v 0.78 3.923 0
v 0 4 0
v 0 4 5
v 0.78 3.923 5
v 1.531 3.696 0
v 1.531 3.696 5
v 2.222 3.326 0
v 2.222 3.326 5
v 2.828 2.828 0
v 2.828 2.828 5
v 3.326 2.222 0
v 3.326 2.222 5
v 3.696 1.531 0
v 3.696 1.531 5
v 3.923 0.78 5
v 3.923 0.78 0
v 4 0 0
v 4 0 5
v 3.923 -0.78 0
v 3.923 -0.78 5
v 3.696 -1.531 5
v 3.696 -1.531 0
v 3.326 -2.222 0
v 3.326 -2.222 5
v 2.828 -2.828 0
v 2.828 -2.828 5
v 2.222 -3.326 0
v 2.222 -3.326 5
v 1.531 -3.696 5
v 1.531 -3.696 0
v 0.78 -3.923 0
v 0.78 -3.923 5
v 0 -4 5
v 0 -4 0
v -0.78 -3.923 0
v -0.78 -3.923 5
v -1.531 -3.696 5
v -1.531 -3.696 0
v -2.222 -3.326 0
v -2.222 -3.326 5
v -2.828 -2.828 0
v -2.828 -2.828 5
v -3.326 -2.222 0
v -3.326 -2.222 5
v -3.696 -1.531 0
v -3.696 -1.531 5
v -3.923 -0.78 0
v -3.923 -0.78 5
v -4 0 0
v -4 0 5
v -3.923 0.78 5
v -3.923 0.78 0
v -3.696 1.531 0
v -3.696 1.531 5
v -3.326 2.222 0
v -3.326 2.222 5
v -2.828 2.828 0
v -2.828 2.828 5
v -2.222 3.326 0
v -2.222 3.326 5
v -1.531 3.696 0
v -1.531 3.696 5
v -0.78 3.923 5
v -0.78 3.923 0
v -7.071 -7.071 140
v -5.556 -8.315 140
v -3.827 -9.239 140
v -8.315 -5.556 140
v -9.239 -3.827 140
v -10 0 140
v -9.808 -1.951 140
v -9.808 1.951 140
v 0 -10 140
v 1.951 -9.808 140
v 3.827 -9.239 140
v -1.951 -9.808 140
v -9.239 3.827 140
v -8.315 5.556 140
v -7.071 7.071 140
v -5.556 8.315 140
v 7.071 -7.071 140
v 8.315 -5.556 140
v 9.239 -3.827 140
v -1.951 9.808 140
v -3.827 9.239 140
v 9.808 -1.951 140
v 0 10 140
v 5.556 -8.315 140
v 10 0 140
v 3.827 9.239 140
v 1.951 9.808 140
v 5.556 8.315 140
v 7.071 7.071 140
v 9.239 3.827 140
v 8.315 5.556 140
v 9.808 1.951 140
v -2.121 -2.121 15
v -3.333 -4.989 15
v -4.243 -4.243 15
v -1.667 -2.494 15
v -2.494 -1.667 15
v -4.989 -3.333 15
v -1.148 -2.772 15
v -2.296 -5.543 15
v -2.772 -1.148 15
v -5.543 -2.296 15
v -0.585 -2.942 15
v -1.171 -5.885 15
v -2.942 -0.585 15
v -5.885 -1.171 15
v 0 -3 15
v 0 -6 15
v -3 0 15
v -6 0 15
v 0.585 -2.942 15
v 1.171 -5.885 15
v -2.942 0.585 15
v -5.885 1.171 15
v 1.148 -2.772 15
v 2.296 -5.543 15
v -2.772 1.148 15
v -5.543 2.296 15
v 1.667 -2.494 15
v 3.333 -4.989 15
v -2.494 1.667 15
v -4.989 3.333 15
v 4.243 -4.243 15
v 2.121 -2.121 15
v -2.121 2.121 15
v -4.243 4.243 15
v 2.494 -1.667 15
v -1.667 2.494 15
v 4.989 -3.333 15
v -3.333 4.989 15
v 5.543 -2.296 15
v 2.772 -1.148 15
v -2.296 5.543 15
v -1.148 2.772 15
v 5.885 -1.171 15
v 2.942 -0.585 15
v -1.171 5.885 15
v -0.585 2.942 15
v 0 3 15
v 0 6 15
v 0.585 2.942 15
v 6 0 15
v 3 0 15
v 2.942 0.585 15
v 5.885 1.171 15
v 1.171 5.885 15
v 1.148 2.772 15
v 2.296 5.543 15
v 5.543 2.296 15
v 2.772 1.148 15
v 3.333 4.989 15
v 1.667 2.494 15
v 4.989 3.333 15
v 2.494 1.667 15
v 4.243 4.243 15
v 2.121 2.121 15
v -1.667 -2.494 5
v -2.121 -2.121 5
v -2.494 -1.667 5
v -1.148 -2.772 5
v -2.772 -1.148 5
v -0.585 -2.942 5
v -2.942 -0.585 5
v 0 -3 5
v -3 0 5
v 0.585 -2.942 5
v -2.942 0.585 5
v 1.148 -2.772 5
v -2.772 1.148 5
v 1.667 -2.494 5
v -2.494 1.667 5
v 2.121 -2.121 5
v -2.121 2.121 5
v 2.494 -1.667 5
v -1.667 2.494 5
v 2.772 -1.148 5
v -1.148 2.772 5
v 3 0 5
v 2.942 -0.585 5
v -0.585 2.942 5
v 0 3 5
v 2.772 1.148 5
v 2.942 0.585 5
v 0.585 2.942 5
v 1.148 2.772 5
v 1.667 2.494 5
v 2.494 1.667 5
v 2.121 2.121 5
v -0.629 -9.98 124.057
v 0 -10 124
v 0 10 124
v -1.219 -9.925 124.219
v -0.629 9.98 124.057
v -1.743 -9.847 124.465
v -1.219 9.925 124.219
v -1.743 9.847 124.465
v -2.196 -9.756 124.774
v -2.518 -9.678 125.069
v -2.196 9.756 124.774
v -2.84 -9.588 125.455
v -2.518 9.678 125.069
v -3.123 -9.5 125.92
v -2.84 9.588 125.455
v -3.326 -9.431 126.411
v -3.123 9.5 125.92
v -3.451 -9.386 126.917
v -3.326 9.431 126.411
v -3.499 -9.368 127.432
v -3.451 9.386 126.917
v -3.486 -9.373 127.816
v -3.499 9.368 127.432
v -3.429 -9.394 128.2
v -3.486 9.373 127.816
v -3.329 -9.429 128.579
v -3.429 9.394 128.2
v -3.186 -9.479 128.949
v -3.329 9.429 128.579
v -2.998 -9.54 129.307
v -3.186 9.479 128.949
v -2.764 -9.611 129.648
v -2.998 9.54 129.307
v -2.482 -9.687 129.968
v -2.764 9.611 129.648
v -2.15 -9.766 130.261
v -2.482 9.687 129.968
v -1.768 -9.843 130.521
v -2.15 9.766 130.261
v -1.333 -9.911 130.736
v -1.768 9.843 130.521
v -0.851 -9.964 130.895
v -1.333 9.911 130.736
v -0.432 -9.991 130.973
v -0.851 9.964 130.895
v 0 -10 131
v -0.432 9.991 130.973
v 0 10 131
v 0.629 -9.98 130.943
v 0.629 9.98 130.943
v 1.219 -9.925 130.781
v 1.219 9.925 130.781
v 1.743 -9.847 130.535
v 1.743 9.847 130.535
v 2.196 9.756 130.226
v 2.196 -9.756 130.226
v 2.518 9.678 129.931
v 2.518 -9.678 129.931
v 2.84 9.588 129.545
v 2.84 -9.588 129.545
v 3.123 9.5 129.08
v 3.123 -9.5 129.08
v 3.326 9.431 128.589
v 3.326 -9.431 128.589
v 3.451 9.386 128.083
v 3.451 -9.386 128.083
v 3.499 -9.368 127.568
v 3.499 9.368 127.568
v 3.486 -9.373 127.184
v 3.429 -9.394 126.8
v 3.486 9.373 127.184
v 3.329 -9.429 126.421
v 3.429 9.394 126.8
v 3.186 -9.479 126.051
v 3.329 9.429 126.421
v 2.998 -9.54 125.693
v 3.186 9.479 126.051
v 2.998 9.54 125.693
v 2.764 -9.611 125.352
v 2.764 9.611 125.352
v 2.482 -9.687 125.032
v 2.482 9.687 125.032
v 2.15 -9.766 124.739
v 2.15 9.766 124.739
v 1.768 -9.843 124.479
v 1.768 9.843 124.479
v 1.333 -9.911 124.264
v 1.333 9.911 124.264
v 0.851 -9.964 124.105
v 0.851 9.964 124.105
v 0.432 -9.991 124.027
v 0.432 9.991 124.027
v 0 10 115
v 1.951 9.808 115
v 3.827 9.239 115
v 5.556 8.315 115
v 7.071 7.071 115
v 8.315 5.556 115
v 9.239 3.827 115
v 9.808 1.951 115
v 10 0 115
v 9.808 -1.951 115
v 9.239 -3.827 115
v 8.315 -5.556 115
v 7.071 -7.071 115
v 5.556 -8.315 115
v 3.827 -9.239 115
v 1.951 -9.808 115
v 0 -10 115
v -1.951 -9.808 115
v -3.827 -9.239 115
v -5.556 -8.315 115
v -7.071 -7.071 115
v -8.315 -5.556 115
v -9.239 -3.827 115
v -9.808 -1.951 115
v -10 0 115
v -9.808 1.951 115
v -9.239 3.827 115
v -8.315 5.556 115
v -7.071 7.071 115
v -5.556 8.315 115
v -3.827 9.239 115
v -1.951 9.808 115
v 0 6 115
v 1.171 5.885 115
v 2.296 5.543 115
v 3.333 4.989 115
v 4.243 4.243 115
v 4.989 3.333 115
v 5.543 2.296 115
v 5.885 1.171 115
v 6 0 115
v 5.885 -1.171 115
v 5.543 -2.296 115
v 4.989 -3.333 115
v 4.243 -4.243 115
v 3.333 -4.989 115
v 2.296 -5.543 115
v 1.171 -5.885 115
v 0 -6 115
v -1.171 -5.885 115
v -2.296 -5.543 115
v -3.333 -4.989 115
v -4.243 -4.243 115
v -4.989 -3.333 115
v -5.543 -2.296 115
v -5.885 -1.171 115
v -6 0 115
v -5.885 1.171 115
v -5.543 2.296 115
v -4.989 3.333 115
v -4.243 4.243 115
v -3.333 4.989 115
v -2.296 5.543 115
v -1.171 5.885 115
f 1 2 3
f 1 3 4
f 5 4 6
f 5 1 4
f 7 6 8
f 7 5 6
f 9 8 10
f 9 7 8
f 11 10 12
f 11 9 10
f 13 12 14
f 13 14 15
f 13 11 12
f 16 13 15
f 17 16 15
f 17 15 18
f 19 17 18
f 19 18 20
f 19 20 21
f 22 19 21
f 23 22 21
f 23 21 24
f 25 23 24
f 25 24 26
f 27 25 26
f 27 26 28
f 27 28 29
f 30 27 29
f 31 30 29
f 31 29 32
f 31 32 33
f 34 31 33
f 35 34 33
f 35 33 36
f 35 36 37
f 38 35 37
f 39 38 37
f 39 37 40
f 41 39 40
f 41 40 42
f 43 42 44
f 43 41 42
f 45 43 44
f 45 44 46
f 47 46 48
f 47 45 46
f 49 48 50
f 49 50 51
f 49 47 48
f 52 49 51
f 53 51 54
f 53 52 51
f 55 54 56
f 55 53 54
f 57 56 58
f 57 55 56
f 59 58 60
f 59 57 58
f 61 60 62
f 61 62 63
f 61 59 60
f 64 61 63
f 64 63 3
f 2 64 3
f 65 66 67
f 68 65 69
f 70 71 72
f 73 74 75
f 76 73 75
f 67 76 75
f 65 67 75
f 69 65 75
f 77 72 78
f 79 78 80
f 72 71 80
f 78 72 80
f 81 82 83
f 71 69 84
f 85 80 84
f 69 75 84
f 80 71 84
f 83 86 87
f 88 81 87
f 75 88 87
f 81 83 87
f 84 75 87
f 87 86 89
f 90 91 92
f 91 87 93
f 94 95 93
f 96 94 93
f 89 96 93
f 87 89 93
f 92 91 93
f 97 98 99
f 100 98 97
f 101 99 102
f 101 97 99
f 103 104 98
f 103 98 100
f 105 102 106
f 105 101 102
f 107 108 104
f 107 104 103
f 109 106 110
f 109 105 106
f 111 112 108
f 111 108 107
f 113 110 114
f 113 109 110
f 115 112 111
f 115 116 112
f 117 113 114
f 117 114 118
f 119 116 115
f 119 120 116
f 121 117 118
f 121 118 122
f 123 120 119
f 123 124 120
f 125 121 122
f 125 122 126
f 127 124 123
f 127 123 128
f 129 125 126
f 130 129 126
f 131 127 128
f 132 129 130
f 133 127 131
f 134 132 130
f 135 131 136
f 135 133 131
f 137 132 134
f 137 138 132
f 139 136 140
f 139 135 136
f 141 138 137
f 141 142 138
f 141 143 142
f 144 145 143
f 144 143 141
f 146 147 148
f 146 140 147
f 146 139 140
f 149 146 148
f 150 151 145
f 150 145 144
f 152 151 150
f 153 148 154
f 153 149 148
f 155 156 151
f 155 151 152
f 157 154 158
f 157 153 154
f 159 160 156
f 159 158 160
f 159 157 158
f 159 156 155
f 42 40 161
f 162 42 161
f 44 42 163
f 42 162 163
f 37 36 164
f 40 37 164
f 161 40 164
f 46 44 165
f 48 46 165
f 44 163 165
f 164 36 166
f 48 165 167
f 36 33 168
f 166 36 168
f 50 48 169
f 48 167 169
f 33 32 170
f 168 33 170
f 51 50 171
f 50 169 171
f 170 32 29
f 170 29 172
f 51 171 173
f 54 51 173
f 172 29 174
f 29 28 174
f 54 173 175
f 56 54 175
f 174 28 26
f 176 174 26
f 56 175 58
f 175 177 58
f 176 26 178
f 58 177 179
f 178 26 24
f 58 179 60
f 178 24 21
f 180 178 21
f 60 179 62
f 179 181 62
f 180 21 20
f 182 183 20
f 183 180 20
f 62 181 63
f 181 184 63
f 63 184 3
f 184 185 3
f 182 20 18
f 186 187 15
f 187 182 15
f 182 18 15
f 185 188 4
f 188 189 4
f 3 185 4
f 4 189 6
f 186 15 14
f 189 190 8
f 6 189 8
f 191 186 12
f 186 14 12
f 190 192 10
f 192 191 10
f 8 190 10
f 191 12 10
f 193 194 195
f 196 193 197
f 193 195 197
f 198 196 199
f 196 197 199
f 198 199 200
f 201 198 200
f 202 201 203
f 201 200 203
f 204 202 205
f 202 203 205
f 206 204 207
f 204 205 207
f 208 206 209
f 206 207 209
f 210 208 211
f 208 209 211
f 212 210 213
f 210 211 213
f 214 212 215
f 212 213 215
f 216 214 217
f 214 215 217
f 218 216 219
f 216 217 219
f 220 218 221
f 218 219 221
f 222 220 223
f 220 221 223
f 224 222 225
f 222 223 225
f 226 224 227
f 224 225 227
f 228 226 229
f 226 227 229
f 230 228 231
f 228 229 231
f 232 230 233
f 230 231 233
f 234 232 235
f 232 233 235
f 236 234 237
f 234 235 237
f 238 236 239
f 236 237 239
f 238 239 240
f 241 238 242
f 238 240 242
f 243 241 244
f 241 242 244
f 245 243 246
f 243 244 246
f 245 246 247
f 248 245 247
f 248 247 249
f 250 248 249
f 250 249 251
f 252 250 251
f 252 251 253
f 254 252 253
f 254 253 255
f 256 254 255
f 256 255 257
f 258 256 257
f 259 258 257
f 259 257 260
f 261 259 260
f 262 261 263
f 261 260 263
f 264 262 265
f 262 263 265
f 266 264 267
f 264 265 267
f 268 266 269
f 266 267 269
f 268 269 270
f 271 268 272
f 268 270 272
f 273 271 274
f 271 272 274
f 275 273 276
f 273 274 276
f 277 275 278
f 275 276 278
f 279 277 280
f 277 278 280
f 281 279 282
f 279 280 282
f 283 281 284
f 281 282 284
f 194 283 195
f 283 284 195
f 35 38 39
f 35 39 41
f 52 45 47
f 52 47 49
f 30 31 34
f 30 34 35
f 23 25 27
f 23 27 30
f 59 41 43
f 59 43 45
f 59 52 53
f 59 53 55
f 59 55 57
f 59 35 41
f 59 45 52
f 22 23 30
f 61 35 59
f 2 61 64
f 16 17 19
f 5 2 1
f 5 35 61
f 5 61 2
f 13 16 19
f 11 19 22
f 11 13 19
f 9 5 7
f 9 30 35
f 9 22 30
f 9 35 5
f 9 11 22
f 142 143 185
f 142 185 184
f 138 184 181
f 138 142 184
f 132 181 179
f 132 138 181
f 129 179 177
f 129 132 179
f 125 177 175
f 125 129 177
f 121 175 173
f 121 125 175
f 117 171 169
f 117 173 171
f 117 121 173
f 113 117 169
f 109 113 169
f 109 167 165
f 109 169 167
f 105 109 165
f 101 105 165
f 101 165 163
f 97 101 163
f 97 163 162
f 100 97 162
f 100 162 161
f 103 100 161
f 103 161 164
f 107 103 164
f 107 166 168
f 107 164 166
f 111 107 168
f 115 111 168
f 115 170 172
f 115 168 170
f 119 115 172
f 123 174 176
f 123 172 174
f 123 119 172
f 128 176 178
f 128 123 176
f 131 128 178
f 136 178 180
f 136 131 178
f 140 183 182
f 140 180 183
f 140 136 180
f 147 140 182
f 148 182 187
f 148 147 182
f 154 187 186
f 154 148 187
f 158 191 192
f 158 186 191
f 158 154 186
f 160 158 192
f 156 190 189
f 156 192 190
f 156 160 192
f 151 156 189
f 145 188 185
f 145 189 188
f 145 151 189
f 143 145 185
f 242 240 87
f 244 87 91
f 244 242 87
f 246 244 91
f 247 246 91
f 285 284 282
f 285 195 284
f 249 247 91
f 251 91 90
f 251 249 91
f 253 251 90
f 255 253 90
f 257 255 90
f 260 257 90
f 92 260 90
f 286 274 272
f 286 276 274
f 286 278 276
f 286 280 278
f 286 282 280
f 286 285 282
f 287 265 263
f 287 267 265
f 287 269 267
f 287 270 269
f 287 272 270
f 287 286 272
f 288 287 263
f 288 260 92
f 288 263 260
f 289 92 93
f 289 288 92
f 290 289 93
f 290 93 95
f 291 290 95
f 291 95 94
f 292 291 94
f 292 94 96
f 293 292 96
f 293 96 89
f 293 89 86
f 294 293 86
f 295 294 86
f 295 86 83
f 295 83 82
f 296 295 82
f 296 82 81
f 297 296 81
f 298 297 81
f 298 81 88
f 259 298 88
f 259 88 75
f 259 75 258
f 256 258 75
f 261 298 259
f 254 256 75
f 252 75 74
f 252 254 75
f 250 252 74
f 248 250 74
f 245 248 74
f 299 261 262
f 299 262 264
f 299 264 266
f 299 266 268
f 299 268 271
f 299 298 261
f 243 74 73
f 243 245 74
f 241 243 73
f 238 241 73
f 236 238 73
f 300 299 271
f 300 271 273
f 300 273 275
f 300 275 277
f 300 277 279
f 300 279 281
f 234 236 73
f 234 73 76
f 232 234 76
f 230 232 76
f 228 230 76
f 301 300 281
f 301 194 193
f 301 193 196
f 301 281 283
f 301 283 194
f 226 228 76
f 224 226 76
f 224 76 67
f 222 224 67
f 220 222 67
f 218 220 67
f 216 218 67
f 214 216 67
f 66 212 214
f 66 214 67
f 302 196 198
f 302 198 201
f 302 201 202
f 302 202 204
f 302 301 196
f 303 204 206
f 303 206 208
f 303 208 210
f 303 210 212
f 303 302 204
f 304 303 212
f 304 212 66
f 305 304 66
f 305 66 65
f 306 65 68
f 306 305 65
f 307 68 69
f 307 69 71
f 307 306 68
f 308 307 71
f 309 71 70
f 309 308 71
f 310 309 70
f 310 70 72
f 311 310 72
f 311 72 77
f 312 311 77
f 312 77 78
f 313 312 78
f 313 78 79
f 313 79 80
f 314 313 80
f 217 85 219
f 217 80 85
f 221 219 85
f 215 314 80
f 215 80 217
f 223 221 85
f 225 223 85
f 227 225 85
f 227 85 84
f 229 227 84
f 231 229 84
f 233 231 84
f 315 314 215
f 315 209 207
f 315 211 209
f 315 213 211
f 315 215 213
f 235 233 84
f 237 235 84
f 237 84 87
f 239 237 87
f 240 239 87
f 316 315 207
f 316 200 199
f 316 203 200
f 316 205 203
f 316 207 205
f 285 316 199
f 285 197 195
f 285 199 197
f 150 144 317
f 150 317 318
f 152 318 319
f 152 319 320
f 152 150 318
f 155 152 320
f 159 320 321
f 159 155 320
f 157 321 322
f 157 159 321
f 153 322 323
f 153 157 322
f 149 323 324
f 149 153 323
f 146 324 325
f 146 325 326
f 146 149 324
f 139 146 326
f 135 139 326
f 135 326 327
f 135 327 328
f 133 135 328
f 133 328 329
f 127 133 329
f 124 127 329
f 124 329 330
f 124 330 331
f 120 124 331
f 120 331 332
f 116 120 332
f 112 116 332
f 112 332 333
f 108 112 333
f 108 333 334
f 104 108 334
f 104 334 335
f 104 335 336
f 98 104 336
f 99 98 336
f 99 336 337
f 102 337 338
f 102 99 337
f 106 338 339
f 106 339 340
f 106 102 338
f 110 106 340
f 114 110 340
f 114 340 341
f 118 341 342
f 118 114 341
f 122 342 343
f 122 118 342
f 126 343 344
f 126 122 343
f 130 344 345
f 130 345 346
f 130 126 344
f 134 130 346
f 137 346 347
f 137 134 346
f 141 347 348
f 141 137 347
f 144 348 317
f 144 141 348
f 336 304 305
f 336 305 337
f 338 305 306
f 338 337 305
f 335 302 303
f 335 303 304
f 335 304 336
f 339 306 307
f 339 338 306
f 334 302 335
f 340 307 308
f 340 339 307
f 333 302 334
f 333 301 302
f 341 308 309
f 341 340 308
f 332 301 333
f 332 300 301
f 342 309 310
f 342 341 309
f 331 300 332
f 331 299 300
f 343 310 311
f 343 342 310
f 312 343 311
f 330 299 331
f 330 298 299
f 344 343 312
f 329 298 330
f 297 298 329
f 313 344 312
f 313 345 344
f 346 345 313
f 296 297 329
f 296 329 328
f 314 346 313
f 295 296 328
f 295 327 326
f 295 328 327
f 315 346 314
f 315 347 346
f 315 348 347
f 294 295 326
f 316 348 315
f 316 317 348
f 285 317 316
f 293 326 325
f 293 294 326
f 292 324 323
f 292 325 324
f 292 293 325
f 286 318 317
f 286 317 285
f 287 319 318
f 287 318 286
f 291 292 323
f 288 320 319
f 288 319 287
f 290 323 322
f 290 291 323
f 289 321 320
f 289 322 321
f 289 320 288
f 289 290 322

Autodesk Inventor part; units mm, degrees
ref_plane "YZ Plane" through (0, 0, 0) normal (1, 0, 0) x (0, 1, 0)
ref_plane "XY Plane" through (0, 0, 0) normal (0, 0, 1) x (1, 0, 0)
sketch "Sketch1" plane through (0, 0, 0) normal (1, 0, 0) x (0, 1, 0)
  line L0 (0, 140) -> (10, 140)
  line L1 (10, 140) -> (10, 115)
  line L2 (10, 115) -> (6, 115)
  line L3 (6, 115) -> (6, 15)
  line L4 (3, 5) -> (4, 5)
  line L5 (4, 5) -> (4, 0)
  line L6 (4, 0) -> (0, 0)
  line L7 (0, 168) -> (0, -28) projected
  line L8 (-2, 0) -> (12, 0) projected
  line L9 (3, 5) -> (3, 15)
  line L10 (3, 15) -> (6, 15)
  line L11 (0, 140) -> (0, 0)
  dimension "d4" = 25
  dimension "d8" = 5
  dimension "d9" = 140
  dimension "d12" = 15
  dimension "d15" = 12
  dimension "d16" = 6
  dimension "d17" = 8
  dimension "d18" = 20
revolve "Revolution1" add sketch "Sketch1" angle 360 about axis through (0, 0, 140) along (0, 0, -1)
ref_plane "Work Plane1" through (0, -10, 127.5) normal (0, 1, 0) x (-1, 0, 0)
sketch "Sketch2" plane through (0, -10, 127.5) normal (0, 1, 0) x (-1, 0, 0)
  line L0 (0, -155.5) -> (0, 40.5) projected
  line L1 (-10, 12.5) -> (10, 12.5) projected
  point P0 (0, -127.5)
  point P1 (0, 0)
  dimension "d20" = 12.5
hole "Hole1" at (0, -10, 127.5) direction (0, 1, 0) diameter 7 end through all
thread "Thread1" size "M12x1.75" class "6g" standard "ANSI Metric M Profile" full length
properties part number "Spindle"
